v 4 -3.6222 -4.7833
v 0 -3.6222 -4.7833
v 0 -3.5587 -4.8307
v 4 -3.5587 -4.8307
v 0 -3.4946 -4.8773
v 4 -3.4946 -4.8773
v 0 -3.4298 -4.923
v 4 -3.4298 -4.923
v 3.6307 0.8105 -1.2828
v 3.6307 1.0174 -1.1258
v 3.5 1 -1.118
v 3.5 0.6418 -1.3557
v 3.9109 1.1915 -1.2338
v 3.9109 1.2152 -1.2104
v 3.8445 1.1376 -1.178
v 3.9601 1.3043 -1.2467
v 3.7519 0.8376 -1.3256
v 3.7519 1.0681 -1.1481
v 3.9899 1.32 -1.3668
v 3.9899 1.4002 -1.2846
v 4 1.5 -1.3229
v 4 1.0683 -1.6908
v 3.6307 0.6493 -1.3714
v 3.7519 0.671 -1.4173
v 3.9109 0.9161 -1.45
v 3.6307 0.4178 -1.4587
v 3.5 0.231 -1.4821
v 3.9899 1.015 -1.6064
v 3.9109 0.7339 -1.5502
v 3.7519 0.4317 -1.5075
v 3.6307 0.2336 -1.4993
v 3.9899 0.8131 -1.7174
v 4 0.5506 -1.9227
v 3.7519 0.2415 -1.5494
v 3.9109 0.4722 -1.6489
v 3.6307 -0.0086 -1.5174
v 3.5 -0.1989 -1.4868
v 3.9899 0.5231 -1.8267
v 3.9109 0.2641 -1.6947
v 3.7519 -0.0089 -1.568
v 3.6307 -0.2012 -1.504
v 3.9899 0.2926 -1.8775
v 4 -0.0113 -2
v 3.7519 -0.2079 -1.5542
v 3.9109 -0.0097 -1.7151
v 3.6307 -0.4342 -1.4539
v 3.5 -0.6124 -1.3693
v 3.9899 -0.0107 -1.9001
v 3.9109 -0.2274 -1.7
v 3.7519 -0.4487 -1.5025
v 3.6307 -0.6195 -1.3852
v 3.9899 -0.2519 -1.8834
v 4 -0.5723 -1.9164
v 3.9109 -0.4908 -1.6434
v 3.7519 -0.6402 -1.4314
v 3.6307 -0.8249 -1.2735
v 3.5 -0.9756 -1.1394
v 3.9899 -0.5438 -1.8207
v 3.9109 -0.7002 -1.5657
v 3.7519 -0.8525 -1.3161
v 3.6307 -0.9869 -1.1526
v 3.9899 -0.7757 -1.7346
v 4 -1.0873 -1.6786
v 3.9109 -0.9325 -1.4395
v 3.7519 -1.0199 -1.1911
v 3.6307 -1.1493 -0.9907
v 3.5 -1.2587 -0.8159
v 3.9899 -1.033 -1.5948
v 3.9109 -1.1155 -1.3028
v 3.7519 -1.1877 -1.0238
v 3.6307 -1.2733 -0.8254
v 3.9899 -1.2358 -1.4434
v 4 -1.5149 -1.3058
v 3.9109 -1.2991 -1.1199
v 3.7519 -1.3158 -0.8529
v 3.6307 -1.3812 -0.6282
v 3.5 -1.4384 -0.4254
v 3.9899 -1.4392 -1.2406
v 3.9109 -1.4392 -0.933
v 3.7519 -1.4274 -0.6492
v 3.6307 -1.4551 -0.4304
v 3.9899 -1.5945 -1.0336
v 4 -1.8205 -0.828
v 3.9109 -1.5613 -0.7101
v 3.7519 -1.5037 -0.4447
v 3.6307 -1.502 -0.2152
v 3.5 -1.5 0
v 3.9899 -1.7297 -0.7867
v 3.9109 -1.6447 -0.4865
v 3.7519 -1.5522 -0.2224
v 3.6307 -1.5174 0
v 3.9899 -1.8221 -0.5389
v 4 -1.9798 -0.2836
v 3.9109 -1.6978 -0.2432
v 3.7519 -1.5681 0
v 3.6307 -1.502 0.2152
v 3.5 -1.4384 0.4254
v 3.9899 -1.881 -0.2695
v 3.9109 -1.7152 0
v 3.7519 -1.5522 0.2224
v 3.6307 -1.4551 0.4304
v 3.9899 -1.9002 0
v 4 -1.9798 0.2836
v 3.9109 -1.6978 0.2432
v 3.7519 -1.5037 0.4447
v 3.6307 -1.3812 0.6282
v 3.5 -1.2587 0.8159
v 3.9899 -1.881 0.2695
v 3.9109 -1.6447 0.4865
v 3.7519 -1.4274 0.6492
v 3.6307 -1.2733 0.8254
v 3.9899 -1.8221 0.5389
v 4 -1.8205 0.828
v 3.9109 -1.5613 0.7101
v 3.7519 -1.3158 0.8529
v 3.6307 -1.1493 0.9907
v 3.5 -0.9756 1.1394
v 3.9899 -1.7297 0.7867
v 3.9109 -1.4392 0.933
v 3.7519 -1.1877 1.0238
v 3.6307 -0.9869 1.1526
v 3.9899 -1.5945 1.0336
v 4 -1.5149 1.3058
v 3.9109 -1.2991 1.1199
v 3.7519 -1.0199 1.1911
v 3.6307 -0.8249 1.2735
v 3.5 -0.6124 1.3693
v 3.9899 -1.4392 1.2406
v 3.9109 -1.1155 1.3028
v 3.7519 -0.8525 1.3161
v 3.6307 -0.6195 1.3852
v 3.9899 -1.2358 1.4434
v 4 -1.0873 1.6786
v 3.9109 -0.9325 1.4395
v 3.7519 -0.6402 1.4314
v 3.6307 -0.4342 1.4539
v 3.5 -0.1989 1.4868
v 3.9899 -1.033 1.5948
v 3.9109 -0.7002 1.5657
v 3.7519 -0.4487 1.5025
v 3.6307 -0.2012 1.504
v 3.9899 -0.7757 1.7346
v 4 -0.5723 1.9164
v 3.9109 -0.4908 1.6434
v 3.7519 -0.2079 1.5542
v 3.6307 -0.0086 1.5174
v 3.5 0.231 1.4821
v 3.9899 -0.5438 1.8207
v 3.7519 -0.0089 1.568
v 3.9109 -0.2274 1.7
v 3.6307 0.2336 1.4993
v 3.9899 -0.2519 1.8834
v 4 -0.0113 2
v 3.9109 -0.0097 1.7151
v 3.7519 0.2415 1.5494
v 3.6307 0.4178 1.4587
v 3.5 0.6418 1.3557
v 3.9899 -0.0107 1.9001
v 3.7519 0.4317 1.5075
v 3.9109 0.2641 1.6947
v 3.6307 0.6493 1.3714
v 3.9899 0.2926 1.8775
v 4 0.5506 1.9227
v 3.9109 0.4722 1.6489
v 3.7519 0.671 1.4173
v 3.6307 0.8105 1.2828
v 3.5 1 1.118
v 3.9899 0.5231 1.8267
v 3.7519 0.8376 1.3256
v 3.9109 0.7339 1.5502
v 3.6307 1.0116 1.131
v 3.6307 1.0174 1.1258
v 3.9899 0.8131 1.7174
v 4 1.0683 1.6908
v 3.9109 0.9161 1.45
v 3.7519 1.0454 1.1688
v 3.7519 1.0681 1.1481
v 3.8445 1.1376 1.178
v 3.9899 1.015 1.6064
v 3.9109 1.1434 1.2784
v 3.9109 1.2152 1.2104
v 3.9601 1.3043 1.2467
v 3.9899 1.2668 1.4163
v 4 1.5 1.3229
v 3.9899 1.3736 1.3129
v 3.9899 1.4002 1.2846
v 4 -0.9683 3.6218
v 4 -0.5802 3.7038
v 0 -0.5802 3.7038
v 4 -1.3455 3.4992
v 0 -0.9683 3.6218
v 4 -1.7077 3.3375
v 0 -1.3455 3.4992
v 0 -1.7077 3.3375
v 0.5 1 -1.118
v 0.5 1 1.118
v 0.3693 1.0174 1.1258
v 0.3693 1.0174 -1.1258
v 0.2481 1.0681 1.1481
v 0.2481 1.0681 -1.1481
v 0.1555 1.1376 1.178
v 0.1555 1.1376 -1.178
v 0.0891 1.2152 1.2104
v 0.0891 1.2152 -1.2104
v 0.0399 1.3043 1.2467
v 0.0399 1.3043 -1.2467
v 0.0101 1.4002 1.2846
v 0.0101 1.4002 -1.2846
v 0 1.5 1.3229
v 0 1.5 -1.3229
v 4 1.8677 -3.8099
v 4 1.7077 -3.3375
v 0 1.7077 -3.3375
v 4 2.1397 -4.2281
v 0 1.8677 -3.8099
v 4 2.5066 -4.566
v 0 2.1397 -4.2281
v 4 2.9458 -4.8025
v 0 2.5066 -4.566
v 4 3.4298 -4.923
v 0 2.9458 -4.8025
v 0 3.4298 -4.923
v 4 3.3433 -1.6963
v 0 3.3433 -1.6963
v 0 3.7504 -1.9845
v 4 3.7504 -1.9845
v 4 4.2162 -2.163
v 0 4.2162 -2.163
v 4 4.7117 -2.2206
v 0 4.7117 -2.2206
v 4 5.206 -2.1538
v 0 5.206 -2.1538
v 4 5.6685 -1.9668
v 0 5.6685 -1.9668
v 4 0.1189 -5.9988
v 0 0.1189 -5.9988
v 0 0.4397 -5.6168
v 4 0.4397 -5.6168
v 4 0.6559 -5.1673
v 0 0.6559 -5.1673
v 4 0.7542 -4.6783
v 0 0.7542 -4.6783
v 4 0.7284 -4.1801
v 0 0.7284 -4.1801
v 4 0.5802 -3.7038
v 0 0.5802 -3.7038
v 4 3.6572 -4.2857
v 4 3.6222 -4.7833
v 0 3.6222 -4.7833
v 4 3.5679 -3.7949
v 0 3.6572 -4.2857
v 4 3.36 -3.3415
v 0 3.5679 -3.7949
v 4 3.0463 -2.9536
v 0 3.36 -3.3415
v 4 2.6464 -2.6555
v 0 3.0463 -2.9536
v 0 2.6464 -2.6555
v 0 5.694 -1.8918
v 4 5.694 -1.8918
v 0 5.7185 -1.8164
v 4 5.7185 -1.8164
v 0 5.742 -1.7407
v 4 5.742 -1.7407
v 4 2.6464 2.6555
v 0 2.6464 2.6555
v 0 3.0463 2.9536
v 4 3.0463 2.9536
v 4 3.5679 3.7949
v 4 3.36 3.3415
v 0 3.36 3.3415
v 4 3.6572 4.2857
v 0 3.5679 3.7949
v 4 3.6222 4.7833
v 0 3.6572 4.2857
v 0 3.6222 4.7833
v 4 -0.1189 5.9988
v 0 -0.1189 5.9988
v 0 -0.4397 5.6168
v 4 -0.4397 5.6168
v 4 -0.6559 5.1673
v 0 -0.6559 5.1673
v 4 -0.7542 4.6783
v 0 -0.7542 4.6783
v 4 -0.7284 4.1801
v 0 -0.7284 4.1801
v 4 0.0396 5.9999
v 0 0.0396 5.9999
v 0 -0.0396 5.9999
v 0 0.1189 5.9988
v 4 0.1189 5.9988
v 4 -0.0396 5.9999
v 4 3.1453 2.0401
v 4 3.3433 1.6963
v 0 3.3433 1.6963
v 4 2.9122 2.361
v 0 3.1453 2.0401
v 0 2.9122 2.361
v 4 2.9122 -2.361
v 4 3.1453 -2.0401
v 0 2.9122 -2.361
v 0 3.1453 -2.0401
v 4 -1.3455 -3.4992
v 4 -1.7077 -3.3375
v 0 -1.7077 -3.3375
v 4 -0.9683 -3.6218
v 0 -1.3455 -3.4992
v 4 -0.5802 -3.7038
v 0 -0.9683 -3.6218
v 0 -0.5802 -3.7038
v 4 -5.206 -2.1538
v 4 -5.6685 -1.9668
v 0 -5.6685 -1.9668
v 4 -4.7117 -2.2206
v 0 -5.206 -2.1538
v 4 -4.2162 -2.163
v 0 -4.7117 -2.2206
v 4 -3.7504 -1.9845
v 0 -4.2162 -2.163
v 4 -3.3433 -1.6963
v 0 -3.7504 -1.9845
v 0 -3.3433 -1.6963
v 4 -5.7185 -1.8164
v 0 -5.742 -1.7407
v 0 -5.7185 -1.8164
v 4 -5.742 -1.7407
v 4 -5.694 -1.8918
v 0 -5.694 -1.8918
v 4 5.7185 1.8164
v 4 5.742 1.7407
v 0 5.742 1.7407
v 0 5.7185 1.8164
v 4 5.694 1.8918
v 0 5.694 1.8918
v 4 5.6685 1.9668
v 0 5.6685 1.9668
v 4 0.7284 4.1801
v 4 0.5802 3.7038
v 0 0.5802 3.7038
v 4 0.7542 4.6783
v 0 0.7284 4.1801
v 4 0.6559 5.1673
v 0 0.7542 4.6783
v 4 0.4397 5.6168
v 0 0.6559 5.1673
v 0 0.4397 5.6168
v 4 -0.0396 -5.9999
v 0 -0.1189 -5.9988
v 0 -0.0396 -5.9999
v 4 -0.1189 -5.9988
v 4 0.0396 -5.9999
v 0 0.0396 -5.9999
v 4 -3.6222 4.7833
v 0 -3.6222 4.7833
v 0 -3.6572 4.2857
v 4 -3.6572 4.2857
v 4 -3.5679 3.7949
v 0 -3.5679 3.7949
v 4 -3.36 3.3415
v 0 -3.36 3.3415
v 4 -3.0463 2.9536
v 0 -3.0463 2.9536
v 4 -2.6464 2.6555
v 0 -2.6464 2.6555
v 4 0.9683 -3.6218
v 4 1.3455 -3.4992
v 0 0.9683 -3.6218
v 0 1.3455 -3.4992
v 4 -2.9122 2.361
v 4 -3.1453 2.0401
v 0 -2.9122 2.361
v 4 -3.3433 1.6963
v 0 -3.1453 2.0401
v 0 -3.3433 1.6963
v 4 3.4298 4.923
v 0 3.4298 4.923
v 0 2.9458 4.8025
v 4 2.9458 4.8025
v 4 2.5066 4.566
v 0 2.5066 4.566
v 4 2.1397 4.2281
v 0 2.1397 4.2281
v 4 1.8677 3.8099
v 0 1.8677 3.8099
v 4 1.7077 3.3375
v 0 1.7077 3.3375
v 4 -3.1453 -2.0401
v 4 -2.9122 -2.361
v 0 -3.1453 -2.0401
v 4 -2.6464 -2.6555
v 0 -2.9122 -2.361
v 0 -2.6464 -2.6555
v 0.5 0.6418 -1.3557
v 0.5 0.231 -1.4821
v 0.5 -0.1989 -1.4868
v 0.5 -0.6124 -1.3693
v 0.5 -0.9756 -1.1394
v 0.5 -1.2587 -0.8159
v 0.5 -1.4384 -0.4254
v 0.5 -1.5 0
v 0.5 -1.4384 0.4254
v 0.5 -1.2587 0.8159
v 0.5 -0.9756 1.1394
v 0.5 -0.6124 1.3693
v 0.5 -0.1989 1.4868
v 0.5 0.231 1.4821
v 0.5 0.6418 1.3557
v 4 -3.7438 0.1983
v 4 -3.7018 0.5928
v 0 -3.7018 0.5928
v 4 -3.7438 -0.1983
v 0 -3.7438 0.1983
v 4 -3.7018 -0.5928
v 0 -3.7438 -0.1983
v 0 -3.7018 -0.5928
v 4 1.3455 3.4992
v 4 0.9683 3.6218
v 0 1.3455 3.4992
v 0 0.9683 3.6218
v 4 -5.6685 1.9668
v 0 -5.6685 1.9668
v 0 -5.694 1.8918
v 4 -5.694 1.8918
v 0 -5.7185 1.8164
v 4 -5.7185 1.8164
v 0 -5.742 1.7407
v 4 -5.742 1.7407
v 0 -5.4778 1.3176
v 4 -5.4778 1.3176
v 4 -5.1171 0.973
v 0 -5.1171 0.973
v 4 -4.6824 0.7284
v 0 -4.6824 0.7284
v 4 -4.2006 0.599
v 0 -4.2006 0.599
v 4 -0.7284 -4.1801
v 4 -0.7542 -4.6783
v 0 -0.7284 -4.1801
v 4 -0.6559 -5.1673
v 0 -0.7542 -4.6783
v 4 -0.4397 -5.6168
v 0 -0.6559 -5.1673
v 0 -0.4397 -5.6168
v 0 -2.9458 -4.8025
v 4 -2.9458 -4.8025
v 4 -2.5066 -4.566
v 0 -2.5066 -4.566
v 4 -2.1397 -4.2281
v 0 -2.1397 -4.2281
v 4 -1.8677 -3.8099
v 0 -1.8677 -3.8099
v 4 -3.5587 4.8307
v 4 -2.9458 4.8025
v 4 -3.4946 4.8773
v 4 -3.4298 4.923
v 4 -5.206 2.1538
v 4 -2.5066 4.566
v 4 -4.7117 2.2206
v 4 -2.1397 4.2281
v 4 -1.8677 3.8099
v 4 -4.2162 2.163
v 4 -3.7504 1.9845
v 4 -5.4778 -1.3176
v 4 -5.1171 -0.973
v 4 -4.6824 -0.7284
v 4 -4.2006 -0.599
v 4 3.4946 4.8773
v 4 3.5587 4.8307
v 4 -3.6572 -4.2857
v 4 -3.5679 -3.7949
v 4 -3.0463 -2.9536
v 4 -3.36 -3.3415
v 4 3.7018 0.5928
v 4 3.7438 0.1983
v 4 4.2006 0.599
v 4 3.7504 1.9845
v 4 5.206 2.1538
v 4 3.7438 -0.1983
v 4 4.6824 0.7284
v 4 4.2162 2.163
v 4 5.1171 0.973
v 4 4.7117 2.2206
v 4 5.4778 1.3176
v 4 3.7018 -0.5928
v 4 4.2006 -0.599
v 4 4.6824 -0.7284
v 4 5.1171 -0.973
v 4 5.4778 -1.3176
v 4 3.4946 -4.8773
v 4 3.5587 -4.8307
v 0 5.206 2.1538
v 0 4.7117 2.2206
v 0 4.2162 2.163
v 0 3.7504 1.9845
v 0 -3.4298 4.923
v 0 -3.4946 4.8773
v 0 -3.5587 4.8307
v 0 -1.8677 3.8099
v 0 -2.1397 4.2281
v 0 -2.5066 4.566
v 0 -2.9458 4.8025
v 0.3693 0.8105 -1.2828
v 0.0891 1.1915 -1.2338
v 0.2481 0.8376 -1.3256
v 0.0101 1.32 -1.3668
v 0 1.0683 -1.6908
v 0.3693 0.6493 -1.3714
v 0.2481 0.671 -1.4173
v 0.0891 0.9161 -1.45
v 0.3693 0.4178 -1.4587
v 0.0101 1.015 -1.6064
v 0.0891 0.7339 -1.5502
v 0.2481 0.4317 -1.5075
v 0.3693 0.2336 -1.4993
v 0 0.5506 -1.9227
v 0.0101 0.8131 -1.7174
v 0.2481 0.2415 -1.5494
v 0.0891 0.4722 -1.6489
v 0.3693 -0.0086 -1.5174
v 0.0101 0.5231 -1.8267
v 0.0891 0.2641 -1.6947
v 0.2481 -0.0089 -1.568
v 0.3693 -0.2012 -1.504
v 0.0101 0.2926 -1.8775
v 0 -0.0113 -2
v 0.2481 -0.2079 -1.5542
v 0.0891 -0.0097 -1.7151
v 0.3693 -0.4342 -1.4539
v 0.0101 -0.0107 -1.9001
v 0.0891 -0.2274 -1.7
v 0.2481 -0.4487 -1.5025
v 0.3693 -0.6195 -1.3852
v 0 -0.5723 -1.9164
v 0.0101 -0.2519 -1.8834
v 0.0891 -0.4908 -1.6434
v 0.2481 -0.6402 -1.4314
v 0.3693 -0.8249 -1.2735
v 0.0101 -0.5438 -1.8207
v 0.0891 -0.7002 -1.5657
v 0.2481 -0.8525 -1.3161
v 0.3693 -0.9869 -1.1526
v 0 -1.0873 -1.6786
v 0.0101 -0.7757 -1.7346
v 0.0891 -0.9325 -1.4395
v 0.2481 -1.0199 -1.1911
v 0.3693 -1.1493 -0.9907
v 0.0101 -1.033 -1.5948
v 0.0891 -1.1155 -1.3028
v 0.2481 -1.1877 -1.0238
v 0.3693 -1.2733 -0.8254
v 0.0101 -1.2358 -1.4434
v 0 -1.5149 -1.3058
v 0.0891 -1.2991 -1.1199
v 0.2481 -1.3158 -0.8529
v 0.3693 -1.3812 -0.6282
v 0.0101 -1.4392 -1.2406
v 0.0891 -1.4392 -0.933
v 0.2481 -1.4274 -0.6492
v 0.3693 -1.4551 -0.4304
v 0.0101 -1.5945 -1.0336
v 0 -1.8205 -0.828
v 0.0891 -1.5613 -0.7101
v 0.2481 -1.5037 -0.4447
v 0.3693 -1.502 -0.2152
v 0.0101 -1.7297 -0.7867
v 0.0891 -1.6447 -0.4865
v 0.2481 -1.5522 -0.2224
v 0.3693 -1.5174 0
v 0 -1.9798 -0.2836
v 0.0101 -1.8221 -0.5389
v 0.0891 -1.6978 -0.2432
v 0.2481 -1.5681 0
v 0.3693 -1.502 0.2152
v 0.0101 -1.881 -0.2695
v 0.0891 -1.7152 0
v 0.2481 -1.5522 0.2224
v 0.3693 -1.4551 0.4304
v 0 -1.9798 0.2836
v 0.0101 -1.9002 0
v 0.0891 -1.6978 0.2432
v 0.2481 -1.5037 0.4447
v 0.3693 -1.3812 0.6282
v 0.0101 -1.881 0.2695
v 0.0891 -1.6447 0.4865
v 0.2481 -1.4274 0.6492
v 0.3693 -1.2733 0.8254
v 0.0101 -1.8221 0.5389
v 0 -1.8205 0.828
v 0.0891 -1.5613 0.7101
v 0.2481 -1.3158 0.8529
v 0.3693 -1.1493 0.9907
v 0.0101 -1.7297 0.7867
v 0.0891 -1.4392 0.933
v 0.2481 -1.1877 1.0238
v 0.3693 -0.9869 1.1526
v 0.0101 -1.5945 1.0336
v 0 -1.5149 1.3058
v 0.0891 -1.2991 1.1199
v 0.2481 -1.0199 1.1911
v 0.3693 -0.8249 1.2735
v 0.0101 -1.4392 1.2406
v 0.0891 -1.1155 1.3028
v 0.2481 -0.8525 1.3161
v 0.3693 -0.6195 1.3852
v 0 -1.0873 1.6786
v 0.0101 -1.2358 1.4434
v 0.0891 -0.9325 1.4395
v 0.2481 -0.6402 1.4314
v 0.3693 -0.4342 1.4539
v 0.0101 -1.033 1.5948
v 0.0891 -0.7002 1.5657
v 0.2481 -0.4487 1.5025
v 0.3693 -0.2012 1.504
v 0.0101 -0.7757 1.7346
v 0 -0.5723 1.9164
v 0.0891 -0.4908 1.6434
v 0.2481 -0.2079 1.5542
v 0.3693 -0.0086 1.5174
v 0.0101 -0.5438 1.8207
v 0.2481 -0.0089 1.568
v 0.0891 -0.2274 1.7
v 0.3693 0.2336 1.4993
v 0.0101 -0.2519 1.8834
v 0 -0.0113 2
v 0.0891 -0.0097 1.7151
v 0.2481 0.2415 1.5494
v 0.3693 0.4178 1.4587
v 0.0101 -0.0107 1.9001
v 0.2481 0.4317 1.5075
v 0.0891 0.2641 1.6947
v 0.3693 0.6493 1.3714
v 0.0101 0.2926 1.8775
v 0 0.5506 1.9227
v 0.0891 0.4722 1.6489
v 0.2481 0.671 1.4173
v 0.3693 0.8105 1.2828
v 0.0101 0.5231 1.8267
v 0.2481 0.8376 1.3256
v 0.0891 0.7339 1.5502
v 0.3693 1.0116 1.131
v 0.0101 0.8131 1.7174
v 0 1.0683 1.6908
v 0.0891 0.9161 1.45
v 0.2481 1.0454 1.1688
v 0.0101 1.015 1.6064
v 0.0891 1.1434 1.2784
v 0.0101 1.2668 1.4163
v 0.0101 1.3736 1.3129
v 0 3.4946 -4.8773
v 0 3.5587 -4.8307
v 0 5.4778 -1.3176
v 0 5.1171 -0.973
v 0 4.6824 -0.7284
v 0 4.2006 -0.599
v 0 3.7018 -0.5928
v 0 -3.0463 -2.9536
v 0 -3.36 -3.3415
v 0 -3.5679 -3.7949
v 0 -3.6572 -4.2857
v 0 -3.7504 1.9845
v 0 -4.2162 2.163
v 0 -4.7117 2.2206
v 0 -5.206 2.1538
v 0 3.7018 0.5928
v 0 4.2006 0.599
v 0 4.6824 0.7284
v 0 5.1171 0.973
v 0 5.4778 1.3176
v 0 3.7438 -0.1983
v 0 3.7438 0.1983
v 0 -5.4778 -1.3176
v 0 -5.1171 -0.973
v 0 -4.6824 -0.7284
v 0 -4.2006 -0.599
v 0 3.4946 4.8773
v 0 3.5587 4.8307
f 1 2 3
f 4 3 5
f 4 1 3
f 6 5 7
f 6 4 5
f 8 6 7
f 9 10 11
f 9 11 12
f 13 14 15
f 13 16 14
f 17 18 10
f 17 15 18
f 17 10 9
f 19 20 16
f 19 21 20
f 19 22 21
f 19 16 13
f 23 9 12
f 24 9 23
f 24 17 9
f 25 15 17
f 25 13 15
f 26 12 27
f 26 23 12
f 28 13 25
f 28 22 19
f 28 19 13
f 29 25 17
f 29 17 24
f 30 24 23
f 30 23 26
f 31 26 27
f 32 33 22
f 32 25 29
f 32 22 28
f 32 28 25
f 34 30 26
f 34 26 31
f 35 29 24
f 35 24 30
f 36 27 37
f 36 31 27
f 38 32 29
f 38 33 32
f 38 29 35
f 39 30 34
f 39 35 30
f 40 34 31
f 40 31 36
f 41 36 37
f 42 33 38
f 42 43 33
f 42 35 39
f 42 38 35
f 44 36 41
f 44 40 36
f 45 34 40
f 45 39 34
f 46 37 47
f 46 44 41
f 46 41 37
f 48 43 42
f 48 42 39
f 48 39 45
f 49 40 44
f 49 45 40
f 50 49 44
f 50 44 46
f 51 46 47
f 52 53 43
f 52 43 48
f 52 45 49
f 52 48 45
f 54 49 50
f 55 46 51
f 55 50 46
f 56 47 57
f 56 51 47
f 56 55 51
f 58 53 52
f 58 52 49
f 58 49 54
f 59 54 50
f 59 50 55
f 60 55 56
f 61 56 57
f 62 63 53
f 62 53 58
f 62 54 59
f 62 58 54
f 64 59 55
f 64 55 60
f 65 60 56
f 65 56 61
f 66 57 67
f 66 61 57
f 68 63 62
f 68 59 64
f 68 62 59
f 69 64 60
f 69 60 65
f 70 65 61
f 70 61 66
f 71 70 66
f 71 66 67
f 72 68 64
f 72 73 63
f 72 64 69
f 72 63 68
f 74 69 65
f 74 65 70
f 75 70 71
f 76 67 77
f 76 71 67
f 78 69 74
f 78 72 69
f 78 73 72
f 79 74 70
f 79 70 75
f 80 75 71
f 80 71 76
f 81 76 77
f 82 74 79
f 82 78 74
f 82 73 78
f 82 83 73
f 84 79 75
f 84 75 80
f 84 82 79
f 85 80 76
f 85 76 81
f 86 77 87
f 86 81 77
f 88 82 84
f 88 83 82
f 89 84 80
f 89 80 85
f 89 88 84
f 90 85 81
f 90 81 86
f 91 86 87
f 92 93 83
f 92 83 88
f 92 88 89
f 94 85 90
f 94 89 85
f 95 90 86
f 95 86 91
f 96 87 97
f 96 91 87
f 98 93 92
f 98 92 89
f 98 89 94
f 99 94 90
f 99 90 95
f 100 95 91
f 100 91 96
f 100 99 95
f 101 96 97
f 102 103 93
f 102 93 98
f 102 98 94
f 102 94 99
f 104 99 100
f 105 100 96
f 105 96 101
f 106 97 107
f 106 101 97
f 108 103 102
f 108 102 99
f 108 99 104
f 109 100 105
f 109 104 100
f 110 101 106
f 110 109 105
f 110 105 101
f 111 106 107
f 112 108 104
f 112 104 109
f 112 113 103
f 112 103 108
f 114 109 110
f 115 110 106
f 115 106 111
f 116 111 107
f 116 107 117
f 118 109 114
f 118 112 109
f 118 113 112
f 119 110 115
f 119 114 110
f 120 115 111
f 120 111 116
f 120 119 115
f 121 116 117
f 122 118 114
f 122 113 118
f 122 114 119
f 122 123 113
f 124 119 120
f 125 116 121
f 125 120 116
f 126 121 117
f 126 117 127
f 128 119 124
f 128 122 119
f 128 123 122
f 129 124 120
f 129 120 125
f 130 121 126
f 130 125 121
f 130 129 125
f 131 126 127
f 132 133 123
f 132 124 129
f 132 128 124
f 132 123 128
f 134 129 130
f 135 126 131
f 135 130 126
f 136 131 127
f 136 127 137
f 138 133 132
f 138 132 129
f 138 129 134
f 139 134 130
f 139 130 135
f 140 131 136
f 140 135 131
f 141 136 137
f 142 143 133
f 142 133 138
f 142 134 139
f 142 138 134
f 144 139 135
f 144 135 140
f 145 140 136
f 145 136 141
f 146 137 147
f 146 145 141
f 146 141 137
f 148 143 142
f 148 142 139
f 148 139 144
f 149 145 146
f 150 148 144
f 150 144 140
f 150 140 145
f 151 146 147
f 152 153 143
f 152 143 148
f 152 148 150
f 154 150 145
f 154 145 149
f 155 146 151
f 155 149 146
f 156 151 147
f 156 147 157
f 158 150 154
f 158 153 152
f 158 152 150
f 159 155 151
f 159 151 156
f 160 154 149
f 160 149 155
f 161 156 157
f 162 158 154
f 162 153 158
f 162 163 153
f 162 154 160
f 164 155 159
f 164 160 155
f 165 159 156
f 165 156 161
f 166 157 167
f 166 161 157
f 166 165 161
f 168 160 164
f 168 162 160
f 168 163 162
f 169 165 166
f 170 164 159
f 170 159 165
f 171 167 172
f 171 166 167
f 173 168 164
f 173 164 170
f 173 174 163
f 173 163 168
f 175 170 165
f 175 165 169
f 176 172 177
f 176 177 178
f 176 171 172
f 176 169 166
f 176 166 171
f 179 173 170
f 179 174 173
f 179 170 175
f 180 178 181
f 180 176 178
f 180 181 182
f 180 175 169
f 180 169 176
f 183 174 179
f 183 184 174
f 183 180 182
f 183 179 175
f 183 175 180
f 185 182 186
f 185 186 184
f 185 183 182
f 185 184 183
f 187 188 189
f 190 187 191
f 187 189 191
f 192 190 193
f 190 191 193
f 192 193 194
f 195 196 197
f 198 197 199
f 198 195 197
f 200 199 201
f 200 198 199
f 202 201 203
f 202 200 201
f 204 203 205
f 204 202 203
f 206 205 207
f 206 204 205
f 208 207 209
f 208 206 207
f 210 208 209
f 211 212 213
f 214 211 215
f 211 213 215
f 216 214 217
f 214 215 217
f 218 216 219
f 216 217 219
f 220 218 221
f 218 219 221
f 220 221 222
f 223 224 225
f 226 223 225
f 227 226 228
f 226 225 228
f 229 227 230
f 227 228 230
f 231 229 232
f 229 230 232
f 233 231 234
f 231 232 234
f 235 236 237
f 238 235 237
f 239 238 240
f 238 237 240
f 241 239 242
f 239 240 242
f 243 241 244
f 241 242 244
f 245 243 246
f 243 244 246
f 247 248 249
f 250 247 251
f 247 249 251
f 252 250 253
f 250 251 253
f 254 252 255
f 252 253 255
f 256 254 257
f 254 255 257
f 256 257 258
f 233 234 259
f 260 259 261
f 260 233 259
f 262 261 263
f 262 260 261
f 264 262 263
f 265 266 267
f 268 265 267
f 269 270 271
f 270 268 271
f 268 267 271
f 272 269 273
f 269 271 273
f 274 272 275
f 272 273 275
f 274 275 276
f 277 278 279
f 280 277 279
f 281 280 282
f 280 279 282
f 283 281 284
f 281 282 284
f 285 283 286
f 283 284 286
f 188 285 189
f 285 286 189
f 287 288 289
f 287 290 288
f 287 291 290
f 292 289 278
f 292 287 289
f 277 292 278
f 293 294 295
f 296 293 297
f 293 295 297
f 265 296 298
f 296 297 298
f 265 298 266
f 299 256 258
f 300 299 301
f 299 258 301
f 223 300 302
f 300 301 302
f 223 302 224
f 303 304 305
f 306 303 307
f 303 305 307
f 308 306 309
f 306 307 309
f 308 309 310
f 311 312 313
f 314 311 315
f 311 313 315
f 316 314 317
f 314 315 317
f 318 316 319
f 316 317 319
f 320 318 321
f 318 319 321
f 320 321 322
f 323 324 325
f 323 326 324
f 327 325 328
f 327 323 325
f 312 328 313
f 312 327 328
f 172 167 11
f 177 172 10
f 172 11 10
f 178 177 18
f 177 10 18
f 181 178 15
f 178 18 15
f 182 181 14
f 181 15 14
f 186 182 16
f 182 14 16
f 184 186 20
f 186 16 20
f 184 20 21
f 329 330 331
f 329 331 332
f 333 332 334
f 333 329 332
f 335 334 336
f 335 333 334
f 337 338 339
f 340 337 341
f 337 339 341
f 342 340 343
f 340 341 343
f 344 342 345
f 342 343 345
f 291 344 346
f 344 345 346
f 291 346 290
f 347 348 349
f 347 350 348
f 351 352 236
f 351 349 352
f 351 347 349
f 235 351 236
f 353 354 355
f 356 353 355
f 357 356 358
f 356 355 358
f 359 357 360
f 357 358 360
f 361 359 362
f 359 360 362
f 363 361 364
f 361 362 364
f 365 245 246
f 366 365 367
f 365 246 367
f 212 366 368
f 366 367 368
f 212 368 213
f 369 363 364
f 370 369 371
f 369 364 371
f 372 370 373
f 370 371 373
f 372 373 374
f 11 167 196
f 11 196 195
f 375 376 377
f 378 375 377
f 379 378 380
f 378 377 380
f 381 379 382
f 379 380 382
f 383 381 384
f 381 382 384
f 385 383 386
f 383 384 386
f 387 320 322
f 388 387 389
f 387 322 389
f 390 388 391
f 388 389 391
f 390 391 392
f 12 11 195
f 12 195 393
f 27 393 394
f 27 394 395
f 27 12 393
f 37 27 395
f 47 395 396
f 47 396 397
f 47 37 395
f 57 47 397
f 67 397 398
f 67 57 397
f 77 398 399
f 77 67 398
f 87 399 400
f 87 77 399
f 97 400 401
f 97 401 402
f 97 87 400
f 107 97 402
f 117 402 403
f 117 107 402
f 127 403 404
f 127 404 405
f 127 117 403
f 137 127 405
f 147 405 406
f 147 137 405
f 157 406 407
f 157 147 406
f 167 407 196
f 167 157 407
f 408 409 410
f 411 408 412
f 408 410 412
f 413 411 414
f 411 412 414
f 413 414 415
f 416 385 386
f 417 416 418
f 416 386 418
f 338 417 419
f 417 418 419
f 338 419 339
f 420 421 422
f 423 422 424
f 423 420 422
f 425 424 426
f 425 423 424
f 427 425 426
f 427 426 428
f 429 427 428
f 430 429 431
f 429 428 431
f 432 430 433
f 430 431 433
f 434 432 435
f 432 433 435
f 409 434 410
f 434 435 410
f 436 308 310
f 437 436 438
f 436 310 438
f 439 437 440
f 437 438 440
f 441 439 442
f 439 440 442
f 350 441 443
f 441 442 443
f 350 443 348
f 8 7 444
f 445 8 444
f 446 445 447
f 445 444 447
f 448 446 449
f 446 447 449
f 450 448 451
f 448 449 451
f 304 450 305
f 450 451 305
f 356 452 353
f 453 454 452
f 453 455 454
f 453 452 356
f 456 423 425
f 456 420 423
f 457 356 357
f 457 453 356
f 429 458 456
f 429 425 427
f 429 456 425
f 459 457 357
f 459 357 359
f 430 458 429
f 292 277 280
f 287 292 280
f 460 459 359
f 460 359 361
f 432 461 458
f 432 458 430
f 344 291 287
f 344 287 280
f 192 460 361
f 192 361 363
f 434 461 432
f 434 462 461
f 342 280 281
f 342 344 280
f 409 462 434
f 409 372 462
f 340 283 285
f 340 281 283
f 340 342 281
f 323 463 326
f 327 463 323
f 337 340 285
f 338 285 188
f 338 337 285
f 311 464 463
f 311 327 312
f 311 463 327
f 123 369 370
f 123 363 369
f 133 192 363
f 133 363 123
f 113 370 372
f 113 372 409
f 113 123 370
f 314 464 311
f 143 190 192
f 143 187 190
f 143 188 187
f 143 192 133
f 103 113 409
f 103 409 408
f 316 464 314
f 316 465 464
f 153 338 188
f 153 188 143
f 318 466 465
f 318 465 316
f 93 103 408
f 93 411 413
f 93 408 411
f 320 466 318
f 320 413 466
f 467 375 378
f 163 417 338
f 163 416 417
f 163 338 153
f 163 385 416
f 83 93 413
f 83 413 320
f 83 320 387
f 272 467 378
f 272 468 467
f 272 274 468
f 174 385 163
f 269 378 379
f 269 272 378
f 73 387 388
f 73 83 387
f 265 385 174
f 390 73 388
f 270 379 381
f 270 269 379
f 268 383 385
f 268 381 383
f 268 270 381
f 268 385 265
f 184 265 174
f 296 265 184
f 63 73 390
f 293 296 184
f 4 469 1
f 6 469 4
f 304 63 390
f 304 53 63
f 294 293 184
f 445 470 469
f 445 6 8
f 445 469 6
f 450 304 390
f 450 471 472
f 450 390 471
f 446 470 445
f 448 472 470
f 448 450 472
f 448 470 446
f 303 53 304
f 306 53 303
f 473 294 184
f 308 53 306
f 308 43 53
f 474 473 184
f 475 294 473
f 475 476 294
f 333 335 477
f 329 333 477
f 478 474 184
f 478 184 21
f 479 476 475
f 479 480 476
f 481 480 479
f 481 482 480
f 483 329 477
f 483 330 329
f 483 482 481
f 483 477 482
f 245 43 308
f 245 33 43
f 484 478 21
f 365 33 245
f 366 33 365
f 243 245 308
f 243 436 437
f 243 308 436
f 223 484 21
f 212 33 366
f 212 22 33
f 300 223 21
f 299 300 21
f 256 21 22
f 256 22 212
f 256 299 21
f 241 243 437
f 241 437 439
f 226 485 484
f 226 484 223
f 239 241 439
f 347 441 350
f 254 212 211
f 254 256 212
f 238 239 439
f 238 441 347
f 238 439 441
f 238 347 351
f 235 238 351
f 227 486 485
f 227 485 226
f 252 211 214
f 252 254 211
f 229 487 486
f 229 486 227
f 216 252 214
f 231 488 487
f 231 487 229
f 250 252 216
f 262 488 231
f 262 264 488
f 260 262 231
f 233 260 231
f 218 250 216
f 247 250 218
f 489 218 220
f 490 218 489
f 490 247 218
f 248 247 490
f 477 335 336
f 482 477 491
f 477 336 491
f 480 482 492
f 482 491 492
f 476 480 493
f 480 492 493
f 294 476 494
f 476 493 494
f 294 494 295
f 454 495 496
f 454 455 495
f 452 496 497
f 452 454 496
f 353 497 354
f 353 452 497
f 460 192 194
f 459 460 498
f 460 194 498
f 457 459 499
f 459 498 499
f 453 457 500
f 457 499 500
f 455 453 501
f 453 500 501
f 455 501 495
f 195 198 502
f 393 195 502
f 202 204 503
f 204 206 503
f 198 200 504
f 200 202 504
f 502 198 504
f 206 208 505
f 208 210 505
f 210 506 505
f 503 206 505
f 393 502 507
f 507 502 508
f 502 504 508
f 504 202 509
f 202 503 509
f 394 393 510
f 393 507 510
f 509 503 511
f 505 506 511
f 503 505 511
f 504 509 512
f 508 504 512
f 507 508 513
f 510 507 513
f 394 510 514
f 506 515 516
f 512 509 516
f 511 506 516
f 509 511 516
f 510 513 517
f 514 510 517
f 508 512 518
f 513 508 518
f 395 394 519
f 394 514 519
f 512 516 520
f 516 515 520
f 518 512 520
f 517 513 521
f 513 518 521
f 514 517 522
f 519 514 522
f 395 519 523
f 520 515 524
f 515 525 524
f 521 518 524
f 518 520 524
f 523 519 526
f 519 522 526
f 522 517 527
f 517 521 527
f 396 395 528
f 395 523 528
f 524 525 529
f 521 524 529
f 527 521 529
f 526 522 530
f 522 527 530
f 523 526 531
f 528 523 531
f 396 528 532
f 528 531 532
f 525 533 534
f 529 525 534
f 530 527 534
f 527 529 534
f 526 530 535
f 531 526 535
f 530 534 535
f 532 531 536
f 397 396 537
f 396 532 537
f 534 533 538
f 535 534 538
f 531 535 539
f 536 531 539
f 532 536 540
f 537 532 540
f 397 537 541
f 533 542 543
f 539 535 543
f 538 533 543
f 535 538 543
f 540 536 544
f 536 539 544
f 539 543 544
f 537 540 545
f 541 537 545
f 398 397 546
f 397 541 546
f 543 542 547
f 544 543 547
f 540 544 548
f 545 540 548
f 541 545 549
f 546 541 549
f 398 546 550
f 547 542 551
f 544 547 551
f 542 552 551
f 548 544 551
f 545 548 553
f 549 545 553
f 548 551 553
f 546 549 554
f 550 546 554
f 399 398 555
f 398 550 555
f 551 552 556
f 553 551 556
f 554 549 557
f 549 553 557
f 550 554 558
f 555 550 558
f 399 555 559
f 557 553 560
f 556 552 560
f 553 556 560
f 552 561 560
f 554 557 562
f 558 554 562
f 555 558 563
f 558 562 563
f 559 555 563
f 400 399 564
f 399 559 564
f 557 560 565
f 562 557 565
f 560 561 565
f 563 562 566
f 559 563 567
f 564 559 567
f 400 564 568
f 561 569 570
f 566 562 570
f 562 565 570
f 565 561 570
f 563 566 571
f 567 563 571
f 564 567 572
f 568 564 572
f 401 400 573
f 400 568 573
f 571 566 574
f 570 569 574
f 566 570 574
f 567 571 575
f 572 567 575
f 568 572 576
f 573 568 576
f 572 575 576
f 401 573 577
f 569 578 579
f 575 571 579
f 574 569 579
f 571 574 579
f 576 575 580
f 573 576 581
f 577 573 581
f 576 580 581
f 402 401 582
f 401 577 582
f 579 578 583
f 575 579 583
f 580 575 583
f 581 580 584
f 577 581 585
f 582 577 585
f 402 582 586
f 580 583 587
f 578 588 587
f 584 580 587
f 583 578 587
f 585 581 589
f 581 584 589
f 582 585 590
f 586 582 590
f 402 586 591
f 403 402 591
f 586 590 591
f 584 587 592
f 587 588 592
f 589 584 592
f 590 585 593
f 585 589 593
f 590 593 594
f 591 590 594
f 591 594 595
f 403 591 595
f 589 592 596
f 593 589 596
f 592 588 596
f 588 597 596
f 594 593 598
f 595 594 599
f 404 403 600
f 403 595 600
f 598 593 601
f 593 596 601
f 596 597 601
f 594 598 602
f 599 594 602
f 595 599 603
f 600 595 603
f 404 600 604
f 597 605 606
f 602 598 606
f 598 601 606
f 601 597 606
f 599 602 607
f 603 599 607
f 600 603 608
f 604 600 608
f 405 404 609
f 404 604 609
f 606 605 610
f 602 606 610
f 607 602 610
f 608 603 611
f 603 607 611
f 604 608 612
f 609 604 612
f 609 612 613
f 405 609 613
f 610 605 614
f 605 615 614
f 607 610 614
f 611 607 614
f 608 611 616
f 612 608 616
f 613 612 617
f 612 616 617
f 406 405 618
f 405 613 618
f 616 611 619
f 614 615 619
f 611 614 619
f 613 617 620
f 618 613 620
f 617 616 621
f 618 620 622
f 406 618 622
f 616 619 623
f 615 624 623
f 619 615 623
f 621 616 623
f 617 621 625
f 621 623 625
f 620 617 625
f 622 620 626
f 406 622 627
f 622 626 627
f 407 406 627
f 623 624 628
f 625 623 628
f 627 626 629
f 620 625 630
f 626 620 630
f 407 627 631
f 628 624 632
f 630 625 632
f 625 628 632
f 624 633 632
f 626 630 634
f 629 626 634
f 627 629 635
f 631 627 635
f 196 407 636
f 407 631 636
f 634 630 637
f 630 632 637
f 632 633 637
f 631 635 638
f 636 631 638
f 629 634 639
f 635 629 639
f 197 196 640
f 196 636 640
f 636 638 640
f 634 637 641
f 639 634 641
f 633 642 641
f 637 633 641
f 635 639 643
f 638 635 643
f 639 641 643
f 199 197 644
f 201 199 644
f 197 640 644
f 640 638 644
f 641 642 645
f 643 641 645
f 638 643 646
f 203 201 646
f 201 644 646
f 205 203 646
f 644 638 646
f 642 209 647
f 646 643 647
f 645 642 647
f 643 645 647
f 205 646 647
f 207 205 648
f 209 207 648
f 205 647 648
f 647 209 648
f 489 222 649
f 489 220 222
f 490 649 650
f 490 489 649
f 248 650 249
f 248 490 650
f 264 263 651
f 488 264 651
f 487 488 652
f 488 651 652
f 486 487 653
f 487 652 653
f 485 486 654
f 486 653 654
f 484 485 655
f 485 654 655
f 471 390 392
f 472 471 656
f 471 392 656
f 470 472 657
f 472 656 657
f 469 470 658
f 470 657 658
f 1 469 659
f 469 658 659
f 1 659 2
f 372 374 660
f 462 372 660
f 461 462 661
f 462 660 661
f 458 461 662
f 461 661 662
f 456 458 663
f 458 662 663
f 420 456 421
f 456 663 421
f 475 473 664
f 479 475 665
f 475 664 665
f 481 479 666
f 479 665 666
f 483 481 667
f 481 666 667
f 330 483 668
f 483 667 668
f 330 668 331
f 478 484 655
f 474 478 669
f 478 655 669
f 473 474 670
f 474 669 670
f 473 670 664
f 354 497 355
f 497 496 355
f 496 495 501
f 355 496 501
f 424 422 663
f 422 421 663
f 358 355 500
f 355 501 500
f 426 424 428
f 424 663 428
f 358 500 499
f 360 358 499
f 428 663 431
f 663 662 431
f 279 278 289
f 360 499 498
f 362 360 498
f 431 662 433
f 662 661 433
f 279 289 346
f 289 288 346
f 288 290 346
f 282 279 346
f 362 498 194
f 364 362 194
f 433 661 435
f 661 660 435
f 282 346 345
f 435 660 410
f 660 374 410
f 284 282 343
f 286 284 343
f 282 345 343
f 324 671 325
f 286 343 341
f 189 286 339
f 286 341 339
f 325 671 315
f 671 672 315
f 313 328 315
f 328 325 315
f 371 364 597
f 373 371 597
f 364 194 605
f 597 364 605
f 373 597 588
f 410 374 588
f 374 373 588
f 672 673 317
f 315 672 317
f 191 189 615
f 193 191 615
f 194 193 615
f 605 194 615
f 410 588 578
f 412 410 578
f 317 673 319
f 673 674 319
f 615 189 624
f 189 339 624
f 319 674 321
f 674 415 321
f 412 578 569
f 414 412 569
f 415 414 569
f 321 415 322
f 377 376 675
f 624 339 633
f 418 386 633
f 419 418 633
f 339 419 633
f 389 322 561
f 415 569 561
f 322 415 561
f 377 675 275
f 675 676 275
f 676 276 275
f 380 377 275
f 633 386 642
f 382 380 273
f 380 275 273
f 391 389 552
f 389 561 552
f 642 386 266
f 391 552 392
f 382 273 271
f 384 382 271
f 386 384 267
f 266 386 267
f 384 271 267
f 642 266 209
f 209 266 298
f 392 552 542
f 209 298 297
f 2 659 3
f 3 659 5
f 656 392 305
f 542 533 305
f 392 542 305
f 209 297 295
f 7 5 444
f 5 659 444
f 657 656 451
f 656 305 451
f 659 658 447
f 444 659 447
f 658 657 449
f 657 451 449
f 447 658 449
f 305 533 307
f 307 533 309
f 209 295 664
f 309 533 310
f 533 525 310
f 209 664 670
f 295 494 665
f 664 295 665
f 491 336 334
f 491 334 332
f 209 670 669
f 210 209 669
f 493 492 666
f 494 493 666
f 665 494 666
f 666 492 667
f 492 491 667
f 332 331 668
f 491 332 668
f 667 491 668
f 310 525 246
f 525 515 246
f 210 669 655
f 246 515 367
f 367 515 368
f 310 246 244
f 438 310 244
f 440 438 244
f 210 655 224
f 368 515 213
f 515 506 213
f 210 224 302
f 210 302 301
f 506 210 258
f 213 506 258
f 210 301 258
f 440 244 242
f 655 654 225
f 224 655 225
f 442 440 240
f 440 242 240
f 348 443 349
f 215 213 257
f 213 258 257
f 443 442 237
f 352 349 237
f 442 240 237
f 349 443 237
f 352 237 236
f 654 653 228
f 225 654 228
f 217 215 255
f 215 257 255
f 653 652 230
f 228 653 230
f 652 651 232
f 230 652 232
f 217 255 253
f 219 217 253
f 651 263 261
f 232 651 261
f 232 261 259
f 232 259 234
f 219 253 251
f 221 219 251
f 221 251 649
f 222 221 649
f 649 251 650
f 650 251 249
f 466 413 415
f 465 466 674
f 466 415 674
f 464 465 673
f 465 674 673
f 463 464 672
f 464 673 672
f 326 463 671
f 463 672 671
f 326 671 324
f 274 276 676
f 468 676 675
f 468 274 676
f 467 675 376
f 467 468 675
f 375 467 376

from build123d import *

# Parameters (mm, degrees)
BASPROSKE_W         = 4
BASPROSKE_H         = 6
TOOTHCUT_DEPTH      = 10.38083152
TEETHCUTS_COUNT     = 10
TEETHCUTS_ANGLE     = 324
BORSKE_R            = 2.5
BORE_DEPTH          = 50.0000508
SKETCH1_R           = 2.5
BOSS_EXTRUDE1_DEPTH = 4
FILLET1_R           = 0.5


with BuildPart() as part:
    # BasProSke → Base-Revolve (revolve)
    with BuildSketch(Plane(origin=(0, 0, 0), x_dir=(1, 0, 0), z_dir=(0, 1, 0)), mode=Mode.PRIVATE) as base_revolve_sk:
        with Locations((2, 3)):
            Rectangle(BASPROSKE_W, BASPROSKE_H)
    revolve(base_revolve_sk.sketch.rotate(Axis((-10, 0, 0), (1, 0, 0)), 180), axis=Axis((-10, 0, 0), (1, 0, 0)))

    # TooCutSke → ToothCut (cut, through all)
    with BuildSketch(Plane(origin=(0, 0, 0), x_dir=(0, 0, -1), z_dir=(1, 0, 0))):
        with BuildLine():
            ThreePointArc((0.59278292, 3.701838653), (0, 3.749), (-0.59278292, 3.701838653))
            ThreePointArc((-0.59278292, 3.701838653), (-0.846593509, 4.924114224), (-1.775771316, 5.757784417))
            ThreePointArc((-1.775771316, 5.757784417), (0, 6.0254), (1.775771316, 5.757784417))
            ThreePointArc((1.775771316, 5.757784417), (0.846593509, 4.924114224), (0.59278292, 3.701838653))
        make_face()
    toothcut = extrude(amount=TOOTHCUT_DEPTH, mode=Mode.SUBTRACT)

    # TeethCuts: ToothCut ×10 about axis
    teethcuts_axis = Axis((-10, 0, 0), (1, 0, 0))
    for i in range(1, TEETHCUTS_COUNT):
        add(toothcut.rotate(teethcuts_axis, i * TEETHCUTS_ANGLE / (TEETHCUTS_COUNT - 1)), mode=Mode.SUBTRACT)

    # BorSke → Bore (cut, symmetric)
    with BuildSketch(Plane(origin=(0, 0, 0), x_dir=(0, 0, -1), z_dir=(1, 0, 0))):
        with Locations(Location((0, 0, 0), (0, 0, 180))):
            Circle(BORSKE_R)
    extrude(amount=BORE_DEPTH, both=True, mode=Mode.SUBTRACT)

    # Sketch1 → Boss-Extrude1 (add)
    with BuildSketch(Plane(origin=(4, 0, 0), x_dir=(0, 0, -1), z_dir=(1, 0, 0))):
        Circle(SKETCH1_R)
        with BuildLine():
            Line((-1.118033989, 1), (1.118033989, 1))
            ThreePointArc((1.118033989, 1), (0, -1.5), (-1.118033989, 1))
        make_face(mode=Mode.SUBTRACT)
    extrude(amount=-BOSS_EXTRUDE1_DEPTH)

    # Fillet1
    fillet1_edges = [part.edges().sort_by_distance(p)[0] for p in [
        (0, 1, 0),
        (4, 1, 0),
        (0, -1.5, 0),
        (4, -1.5, 0),
    ]]
    fillet(fillet1_edges, radius=FILLET1_R)


solid = part.part
